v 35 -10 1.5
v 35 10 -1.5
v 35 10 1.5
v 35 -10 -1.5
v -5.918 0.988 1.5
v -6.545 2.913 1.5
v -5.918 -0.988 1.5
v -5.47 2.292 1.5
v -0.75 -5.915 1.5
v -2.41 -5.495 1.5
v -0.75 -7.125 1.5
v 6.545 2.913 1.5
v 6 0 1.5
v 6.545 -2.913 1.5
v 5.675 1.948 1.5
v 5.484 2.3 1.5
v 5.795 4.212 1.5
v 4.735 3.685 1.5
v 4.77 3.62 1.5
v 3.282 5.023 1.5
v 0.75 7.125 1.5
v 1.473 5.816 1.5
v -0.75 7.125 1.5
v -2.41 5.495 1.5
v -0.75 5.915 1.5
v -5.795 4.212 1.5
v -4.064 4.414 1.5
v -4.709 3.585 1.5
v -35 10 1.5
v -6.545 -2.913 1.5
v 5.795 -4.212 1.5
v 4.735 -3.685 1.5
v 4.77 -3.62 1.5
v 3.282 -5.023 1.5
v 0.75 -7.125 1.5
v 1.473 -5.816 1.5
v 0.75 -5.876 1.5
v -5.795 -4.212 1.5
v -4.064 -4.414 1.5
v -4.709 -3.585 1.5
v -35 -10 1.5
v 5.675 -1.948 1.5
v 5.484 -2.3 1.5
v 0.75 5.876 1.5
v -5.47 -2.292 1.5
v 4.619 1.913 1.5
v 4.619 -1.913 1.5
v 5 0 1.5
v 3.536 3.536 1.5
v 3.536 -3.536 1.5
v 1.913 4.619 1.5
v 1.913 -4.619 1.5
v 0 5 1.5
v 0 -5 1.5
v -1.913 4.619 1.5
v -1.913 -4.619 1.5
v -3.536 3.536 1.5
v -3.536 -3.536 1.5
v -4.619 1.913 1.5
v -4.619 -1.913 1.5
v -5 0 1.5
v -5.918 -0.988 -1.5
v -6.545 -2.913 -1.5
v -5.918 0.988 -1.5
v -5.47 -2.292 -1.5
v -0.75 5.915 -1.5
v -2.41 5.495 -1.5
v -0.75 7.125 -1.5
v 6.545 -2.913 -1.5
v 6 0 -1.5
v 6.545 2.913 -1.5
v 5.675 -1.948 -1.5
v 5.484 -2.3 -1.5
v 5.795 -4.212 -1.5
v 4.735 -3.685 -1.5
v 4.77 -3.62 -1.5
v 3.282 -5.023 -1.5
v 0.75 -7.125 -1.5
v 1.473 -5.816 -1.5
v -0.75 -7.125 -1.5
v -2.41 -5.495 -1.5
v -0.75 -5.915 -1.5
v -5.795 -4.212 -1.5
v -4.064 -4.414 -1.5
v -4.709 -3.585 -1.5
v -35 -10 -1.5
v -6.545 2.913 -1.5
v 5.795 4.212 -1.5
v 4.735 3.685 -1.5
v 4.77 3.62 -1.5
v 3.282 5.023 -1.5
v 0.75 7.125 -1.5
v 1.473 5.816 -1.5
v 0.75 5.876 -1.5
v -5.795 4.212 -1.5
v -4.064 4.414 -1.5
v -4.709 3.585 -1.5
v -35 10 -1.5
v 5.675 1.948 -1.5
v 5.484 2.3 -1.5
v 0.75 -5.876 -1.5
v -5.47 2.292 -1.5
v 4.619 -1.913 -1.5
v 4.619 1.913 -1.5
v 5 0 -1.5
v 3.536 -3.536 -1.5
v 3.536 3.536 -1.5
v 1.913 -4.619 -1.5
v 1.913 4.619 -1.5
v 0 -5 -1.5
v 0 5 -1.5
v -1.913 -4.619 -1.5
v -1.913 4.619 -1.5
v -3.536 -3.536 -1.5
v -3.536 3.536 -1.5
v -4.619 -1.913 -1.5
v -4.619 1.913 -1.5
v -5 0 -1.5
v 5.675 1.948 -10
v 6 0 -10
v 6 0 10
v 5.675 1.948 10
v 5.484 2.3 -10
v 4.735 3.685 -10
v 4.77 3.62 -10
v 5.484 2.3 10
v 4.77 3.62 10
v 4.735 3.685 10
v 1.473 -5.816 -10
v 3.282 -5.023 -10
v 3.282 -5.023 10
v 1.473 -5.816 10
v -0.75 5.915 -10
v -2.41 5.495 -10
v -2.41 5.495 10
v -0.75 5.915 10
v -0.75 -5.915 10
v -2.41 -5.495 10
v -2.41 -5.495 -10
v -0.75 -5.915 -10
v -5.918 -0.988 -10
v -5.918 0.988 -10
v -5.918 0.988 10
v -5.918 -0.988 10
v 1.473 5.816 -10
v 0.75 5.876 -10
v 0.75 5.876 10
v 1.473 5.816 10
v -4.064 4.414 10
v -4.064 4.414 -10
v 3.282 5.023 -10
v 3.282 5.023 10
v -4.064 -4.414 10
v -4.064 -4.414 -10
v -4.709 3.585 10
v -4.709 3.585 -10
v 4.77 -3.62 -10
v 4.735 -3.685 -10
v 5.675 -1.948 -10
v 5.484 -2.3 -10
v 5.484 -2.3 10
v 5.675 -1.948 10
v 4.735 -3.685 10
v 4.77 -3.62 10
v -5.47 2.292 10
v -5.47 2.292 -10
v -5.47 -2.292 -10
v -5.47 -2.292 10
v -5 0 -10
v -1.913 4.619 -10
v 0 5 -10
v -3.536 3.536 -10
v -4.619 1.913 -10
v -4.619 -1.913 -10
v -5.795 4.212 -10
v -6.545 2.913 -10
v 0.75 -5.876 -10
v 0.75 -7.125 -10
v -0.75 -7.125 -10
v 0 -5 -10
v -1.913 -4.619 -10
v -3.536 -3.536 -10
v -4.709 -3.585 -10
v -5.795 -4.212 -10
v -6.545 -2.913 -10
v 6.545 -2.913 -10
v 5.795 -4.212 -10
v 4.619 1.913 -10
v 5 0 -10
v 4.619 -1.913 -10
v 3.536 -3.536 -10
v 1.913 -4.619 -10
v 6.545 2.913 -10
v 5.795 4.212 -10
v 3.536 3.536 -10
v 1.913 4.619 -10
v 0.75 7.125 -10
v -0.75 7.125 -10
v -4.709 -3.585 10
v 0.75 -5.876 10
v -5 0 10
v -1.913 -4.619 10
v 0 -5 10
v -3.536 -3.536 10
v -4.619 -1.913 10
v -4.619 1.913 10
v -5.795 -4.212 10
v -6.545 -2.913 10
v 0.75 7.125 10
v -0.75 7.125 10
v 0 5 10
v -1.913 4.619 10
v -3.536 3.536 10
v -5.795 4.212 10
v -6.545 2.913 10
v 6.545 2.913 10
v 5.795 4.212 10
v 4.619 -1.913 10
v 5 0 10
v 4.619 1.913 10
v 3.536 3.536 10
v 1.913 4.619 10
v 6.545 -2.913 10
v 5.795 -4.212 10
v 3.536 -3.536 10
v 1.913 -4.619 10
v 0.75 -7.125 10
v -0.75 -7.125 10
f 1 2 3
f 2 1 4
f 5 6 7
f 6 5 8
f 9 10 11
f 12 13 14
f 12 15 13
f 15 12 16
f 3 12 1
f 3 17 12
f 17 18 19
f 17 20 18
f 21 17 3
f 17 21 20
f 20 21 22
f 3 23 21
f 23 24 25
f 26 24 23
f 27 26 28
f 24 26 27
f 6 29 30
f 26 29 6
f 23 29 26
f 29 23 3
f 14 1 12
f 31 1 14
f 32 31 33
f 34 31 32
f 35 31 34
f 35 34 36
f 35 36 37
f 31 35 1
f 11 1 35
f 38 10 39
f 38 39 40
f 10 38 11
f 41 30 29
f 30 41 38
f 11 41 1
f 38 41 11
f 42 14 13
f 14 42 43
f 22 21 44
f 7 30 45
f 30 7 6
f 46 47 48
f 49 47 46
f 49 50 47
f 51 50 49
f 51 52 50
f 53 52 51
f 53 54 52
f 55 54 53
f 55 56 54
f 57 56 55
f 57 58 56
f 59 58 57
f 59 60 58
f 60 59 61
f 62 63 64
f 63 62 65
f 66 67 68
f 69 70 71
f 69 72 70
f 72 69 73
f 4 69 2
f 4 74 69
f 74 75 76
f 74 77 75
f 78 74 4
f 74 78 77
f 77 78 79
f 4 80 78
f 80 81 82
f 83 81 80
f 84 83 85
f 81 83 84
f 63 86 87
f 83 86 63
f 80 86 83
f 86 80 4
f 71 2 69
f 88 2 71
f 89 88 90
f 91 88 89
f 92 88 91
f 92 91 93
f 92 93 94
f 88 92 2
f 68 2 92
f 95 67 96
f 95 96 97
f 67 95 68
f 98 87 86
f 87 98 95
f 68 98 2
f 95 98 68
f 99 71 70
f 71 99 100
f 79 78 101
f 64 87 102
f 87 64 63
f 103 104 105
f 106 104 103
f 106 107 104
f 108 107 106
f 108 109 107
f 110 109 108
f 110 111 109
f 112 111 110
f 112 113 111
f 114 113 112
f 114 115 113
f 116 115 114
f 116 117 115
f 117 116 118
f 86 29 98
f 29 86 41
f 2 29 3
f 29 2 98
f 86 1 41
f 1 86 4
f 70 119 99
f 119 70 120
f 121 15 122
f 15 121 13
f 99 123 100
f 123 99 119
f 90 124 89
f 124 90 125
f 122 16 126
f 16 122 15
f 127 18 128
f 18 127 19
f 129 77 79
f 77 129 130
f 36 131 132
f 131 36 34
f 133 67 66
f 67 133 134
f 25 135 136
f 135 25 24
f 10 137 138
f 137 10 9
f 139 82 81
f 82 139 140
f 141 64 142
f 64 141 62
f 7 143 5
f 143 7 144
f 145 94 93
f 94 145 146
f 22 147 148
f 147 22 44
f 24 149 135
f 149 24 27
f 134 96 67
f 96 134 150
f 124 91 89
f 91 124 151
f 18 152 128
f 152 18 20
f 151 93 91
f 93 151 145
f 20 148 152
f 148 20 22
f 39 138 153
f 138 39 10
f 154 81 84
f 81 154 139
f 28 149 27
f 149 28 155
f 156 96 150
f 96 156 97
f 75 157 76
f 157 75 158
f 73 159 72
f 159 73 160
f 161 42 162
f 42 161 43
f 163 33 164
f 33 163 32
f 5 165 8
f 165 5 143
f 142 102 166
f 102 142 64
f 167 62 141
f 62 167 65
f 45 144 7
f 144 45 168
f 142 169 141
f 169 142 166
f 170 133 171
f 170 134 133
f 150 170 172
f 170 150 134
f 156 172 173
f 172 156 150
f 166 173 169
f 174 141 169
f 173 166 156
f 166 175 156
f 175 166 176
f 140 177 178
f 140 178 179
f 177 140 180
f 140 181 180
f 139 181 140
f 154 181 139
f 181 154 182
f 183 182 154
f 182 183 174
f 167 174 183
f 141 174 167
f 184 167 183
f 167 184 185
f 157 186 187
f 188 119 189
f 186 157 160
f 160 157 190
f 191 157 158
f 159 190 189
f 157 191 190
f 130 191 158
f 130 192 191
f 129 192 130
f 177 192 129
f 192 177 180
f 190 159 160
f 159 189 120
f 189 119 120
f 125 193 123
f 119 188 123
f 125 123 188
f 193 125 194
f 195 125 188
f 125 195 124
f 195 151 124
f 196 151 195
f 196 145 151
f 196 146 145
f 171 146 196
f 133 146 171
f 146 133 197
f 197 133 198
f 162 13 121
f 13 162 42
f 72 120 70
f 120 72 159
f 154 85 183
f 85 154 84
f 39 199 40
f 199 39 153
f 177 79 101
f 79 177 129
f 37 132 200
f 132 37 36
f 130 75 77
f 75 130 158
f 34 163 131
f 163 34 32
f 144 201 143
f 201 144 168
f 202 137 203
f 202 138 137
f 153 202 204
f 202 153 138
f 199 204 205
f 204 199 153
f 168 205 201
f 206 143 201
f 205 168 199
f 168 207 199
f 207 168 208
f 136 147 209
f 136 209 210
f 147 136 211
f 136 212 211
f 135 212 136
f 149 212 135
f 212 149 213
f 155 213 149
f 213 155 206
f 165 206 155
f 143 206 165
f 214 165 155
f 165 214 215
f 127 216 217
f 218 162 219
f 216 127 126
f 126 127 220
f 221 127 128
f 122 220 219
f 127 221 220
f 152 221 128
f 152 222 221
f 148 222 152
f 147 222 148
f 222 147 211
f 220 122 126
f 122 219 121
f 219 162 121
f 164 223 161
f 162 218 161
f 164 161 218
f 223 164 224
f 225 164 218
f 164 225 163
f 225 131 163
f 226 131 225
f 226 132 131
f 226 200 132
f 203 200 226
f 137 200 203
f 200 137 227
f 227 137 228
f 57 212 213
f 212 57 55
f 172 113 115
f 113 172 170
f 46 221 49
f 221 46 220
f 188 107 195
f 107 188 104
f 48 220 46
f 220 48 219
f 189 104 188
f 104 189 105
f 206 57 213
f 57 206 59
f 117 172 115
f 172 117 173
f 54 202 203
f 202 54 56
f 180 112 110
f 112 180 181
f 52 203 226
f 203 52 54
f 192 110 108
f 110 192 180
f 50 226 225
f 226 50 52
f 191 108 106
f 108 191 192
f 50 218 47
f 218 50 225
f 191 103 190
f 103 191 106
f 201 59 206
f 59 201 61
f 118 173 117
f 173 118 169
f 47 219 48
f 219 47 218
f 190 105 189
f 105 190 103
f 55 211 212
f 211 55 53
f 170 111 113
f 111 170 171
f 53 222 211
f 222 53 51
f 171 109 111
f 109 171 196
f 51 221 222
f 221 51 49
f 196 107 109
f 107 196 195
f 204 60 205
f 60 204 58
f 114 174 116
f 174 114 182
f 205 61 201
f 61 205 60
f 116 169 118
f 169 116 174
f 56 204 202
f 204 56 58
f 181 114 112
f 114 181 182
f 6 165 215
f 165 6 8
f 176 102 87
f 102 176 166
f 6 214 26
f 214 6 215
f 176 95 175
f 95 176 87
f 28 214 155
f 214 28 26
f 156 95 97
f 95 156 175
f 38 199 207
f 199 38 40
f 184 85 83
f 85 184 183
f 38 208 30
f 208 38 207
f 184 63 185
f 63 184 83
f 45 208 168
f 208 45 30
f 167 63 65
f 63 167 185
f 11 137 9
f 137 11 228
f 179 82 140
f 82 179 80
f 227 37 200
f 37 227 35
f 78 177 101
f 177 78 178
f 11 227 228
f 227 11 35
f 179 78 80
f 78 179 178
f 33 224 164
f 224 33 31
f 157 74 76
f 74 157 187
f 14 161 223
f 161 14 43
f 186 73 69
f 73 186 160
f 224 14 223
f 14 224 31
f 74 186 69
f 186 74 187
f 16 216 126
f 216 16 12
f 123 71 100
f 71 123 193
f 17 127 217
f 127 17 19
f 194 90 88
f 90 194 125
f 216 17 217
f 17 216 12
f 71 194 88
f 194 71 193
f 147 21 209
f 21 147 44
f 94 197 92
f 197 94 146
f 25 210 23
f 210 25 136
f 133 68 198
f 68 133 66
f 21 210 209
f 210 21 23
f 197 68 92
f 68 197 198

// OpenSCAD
// all units in mm 
mainWidth = 20;
mainLength = 70;
commonThickness = 3;

indentWidth = 7;
indent1Length = 20;
indent2Length = 25;

middleWasherRadius = 6;
middleWasherThickness = 1;
middleWasherSupportsThick = 1.5;
middleWasherHeight = 20;

sfn = 30;

// TK - corner rounding

difference() {
    cube([mainLength, mainWidth, commonThickness], center=true);
    indents();
}
middleWasher();

module middleWasher() {
    difference() {
        cylinder(r = middleWasherRadius, h = middleWasherHeight, center = true);
        cylinder(r = middleWasherRadius - middleWasherThickness, h = middleWasherHeight * 2, center = true);
    }
    for(i = [1:6]) {
        rotate([0,0,i*60]) {
            translate([0, middleWasherRadius+middleWasherSupportsThick/4, 0]) {
                cube([middleWasherSupportsThick, middleWasherSupportsThick, middleWasherHeight], center=true);
            }
        }
    }
}




module indents() {
    
    
}

module indent(length) {
    // tk corner rounding
    cube([length, indentWidth, commonThickness*2], center=true);
}
